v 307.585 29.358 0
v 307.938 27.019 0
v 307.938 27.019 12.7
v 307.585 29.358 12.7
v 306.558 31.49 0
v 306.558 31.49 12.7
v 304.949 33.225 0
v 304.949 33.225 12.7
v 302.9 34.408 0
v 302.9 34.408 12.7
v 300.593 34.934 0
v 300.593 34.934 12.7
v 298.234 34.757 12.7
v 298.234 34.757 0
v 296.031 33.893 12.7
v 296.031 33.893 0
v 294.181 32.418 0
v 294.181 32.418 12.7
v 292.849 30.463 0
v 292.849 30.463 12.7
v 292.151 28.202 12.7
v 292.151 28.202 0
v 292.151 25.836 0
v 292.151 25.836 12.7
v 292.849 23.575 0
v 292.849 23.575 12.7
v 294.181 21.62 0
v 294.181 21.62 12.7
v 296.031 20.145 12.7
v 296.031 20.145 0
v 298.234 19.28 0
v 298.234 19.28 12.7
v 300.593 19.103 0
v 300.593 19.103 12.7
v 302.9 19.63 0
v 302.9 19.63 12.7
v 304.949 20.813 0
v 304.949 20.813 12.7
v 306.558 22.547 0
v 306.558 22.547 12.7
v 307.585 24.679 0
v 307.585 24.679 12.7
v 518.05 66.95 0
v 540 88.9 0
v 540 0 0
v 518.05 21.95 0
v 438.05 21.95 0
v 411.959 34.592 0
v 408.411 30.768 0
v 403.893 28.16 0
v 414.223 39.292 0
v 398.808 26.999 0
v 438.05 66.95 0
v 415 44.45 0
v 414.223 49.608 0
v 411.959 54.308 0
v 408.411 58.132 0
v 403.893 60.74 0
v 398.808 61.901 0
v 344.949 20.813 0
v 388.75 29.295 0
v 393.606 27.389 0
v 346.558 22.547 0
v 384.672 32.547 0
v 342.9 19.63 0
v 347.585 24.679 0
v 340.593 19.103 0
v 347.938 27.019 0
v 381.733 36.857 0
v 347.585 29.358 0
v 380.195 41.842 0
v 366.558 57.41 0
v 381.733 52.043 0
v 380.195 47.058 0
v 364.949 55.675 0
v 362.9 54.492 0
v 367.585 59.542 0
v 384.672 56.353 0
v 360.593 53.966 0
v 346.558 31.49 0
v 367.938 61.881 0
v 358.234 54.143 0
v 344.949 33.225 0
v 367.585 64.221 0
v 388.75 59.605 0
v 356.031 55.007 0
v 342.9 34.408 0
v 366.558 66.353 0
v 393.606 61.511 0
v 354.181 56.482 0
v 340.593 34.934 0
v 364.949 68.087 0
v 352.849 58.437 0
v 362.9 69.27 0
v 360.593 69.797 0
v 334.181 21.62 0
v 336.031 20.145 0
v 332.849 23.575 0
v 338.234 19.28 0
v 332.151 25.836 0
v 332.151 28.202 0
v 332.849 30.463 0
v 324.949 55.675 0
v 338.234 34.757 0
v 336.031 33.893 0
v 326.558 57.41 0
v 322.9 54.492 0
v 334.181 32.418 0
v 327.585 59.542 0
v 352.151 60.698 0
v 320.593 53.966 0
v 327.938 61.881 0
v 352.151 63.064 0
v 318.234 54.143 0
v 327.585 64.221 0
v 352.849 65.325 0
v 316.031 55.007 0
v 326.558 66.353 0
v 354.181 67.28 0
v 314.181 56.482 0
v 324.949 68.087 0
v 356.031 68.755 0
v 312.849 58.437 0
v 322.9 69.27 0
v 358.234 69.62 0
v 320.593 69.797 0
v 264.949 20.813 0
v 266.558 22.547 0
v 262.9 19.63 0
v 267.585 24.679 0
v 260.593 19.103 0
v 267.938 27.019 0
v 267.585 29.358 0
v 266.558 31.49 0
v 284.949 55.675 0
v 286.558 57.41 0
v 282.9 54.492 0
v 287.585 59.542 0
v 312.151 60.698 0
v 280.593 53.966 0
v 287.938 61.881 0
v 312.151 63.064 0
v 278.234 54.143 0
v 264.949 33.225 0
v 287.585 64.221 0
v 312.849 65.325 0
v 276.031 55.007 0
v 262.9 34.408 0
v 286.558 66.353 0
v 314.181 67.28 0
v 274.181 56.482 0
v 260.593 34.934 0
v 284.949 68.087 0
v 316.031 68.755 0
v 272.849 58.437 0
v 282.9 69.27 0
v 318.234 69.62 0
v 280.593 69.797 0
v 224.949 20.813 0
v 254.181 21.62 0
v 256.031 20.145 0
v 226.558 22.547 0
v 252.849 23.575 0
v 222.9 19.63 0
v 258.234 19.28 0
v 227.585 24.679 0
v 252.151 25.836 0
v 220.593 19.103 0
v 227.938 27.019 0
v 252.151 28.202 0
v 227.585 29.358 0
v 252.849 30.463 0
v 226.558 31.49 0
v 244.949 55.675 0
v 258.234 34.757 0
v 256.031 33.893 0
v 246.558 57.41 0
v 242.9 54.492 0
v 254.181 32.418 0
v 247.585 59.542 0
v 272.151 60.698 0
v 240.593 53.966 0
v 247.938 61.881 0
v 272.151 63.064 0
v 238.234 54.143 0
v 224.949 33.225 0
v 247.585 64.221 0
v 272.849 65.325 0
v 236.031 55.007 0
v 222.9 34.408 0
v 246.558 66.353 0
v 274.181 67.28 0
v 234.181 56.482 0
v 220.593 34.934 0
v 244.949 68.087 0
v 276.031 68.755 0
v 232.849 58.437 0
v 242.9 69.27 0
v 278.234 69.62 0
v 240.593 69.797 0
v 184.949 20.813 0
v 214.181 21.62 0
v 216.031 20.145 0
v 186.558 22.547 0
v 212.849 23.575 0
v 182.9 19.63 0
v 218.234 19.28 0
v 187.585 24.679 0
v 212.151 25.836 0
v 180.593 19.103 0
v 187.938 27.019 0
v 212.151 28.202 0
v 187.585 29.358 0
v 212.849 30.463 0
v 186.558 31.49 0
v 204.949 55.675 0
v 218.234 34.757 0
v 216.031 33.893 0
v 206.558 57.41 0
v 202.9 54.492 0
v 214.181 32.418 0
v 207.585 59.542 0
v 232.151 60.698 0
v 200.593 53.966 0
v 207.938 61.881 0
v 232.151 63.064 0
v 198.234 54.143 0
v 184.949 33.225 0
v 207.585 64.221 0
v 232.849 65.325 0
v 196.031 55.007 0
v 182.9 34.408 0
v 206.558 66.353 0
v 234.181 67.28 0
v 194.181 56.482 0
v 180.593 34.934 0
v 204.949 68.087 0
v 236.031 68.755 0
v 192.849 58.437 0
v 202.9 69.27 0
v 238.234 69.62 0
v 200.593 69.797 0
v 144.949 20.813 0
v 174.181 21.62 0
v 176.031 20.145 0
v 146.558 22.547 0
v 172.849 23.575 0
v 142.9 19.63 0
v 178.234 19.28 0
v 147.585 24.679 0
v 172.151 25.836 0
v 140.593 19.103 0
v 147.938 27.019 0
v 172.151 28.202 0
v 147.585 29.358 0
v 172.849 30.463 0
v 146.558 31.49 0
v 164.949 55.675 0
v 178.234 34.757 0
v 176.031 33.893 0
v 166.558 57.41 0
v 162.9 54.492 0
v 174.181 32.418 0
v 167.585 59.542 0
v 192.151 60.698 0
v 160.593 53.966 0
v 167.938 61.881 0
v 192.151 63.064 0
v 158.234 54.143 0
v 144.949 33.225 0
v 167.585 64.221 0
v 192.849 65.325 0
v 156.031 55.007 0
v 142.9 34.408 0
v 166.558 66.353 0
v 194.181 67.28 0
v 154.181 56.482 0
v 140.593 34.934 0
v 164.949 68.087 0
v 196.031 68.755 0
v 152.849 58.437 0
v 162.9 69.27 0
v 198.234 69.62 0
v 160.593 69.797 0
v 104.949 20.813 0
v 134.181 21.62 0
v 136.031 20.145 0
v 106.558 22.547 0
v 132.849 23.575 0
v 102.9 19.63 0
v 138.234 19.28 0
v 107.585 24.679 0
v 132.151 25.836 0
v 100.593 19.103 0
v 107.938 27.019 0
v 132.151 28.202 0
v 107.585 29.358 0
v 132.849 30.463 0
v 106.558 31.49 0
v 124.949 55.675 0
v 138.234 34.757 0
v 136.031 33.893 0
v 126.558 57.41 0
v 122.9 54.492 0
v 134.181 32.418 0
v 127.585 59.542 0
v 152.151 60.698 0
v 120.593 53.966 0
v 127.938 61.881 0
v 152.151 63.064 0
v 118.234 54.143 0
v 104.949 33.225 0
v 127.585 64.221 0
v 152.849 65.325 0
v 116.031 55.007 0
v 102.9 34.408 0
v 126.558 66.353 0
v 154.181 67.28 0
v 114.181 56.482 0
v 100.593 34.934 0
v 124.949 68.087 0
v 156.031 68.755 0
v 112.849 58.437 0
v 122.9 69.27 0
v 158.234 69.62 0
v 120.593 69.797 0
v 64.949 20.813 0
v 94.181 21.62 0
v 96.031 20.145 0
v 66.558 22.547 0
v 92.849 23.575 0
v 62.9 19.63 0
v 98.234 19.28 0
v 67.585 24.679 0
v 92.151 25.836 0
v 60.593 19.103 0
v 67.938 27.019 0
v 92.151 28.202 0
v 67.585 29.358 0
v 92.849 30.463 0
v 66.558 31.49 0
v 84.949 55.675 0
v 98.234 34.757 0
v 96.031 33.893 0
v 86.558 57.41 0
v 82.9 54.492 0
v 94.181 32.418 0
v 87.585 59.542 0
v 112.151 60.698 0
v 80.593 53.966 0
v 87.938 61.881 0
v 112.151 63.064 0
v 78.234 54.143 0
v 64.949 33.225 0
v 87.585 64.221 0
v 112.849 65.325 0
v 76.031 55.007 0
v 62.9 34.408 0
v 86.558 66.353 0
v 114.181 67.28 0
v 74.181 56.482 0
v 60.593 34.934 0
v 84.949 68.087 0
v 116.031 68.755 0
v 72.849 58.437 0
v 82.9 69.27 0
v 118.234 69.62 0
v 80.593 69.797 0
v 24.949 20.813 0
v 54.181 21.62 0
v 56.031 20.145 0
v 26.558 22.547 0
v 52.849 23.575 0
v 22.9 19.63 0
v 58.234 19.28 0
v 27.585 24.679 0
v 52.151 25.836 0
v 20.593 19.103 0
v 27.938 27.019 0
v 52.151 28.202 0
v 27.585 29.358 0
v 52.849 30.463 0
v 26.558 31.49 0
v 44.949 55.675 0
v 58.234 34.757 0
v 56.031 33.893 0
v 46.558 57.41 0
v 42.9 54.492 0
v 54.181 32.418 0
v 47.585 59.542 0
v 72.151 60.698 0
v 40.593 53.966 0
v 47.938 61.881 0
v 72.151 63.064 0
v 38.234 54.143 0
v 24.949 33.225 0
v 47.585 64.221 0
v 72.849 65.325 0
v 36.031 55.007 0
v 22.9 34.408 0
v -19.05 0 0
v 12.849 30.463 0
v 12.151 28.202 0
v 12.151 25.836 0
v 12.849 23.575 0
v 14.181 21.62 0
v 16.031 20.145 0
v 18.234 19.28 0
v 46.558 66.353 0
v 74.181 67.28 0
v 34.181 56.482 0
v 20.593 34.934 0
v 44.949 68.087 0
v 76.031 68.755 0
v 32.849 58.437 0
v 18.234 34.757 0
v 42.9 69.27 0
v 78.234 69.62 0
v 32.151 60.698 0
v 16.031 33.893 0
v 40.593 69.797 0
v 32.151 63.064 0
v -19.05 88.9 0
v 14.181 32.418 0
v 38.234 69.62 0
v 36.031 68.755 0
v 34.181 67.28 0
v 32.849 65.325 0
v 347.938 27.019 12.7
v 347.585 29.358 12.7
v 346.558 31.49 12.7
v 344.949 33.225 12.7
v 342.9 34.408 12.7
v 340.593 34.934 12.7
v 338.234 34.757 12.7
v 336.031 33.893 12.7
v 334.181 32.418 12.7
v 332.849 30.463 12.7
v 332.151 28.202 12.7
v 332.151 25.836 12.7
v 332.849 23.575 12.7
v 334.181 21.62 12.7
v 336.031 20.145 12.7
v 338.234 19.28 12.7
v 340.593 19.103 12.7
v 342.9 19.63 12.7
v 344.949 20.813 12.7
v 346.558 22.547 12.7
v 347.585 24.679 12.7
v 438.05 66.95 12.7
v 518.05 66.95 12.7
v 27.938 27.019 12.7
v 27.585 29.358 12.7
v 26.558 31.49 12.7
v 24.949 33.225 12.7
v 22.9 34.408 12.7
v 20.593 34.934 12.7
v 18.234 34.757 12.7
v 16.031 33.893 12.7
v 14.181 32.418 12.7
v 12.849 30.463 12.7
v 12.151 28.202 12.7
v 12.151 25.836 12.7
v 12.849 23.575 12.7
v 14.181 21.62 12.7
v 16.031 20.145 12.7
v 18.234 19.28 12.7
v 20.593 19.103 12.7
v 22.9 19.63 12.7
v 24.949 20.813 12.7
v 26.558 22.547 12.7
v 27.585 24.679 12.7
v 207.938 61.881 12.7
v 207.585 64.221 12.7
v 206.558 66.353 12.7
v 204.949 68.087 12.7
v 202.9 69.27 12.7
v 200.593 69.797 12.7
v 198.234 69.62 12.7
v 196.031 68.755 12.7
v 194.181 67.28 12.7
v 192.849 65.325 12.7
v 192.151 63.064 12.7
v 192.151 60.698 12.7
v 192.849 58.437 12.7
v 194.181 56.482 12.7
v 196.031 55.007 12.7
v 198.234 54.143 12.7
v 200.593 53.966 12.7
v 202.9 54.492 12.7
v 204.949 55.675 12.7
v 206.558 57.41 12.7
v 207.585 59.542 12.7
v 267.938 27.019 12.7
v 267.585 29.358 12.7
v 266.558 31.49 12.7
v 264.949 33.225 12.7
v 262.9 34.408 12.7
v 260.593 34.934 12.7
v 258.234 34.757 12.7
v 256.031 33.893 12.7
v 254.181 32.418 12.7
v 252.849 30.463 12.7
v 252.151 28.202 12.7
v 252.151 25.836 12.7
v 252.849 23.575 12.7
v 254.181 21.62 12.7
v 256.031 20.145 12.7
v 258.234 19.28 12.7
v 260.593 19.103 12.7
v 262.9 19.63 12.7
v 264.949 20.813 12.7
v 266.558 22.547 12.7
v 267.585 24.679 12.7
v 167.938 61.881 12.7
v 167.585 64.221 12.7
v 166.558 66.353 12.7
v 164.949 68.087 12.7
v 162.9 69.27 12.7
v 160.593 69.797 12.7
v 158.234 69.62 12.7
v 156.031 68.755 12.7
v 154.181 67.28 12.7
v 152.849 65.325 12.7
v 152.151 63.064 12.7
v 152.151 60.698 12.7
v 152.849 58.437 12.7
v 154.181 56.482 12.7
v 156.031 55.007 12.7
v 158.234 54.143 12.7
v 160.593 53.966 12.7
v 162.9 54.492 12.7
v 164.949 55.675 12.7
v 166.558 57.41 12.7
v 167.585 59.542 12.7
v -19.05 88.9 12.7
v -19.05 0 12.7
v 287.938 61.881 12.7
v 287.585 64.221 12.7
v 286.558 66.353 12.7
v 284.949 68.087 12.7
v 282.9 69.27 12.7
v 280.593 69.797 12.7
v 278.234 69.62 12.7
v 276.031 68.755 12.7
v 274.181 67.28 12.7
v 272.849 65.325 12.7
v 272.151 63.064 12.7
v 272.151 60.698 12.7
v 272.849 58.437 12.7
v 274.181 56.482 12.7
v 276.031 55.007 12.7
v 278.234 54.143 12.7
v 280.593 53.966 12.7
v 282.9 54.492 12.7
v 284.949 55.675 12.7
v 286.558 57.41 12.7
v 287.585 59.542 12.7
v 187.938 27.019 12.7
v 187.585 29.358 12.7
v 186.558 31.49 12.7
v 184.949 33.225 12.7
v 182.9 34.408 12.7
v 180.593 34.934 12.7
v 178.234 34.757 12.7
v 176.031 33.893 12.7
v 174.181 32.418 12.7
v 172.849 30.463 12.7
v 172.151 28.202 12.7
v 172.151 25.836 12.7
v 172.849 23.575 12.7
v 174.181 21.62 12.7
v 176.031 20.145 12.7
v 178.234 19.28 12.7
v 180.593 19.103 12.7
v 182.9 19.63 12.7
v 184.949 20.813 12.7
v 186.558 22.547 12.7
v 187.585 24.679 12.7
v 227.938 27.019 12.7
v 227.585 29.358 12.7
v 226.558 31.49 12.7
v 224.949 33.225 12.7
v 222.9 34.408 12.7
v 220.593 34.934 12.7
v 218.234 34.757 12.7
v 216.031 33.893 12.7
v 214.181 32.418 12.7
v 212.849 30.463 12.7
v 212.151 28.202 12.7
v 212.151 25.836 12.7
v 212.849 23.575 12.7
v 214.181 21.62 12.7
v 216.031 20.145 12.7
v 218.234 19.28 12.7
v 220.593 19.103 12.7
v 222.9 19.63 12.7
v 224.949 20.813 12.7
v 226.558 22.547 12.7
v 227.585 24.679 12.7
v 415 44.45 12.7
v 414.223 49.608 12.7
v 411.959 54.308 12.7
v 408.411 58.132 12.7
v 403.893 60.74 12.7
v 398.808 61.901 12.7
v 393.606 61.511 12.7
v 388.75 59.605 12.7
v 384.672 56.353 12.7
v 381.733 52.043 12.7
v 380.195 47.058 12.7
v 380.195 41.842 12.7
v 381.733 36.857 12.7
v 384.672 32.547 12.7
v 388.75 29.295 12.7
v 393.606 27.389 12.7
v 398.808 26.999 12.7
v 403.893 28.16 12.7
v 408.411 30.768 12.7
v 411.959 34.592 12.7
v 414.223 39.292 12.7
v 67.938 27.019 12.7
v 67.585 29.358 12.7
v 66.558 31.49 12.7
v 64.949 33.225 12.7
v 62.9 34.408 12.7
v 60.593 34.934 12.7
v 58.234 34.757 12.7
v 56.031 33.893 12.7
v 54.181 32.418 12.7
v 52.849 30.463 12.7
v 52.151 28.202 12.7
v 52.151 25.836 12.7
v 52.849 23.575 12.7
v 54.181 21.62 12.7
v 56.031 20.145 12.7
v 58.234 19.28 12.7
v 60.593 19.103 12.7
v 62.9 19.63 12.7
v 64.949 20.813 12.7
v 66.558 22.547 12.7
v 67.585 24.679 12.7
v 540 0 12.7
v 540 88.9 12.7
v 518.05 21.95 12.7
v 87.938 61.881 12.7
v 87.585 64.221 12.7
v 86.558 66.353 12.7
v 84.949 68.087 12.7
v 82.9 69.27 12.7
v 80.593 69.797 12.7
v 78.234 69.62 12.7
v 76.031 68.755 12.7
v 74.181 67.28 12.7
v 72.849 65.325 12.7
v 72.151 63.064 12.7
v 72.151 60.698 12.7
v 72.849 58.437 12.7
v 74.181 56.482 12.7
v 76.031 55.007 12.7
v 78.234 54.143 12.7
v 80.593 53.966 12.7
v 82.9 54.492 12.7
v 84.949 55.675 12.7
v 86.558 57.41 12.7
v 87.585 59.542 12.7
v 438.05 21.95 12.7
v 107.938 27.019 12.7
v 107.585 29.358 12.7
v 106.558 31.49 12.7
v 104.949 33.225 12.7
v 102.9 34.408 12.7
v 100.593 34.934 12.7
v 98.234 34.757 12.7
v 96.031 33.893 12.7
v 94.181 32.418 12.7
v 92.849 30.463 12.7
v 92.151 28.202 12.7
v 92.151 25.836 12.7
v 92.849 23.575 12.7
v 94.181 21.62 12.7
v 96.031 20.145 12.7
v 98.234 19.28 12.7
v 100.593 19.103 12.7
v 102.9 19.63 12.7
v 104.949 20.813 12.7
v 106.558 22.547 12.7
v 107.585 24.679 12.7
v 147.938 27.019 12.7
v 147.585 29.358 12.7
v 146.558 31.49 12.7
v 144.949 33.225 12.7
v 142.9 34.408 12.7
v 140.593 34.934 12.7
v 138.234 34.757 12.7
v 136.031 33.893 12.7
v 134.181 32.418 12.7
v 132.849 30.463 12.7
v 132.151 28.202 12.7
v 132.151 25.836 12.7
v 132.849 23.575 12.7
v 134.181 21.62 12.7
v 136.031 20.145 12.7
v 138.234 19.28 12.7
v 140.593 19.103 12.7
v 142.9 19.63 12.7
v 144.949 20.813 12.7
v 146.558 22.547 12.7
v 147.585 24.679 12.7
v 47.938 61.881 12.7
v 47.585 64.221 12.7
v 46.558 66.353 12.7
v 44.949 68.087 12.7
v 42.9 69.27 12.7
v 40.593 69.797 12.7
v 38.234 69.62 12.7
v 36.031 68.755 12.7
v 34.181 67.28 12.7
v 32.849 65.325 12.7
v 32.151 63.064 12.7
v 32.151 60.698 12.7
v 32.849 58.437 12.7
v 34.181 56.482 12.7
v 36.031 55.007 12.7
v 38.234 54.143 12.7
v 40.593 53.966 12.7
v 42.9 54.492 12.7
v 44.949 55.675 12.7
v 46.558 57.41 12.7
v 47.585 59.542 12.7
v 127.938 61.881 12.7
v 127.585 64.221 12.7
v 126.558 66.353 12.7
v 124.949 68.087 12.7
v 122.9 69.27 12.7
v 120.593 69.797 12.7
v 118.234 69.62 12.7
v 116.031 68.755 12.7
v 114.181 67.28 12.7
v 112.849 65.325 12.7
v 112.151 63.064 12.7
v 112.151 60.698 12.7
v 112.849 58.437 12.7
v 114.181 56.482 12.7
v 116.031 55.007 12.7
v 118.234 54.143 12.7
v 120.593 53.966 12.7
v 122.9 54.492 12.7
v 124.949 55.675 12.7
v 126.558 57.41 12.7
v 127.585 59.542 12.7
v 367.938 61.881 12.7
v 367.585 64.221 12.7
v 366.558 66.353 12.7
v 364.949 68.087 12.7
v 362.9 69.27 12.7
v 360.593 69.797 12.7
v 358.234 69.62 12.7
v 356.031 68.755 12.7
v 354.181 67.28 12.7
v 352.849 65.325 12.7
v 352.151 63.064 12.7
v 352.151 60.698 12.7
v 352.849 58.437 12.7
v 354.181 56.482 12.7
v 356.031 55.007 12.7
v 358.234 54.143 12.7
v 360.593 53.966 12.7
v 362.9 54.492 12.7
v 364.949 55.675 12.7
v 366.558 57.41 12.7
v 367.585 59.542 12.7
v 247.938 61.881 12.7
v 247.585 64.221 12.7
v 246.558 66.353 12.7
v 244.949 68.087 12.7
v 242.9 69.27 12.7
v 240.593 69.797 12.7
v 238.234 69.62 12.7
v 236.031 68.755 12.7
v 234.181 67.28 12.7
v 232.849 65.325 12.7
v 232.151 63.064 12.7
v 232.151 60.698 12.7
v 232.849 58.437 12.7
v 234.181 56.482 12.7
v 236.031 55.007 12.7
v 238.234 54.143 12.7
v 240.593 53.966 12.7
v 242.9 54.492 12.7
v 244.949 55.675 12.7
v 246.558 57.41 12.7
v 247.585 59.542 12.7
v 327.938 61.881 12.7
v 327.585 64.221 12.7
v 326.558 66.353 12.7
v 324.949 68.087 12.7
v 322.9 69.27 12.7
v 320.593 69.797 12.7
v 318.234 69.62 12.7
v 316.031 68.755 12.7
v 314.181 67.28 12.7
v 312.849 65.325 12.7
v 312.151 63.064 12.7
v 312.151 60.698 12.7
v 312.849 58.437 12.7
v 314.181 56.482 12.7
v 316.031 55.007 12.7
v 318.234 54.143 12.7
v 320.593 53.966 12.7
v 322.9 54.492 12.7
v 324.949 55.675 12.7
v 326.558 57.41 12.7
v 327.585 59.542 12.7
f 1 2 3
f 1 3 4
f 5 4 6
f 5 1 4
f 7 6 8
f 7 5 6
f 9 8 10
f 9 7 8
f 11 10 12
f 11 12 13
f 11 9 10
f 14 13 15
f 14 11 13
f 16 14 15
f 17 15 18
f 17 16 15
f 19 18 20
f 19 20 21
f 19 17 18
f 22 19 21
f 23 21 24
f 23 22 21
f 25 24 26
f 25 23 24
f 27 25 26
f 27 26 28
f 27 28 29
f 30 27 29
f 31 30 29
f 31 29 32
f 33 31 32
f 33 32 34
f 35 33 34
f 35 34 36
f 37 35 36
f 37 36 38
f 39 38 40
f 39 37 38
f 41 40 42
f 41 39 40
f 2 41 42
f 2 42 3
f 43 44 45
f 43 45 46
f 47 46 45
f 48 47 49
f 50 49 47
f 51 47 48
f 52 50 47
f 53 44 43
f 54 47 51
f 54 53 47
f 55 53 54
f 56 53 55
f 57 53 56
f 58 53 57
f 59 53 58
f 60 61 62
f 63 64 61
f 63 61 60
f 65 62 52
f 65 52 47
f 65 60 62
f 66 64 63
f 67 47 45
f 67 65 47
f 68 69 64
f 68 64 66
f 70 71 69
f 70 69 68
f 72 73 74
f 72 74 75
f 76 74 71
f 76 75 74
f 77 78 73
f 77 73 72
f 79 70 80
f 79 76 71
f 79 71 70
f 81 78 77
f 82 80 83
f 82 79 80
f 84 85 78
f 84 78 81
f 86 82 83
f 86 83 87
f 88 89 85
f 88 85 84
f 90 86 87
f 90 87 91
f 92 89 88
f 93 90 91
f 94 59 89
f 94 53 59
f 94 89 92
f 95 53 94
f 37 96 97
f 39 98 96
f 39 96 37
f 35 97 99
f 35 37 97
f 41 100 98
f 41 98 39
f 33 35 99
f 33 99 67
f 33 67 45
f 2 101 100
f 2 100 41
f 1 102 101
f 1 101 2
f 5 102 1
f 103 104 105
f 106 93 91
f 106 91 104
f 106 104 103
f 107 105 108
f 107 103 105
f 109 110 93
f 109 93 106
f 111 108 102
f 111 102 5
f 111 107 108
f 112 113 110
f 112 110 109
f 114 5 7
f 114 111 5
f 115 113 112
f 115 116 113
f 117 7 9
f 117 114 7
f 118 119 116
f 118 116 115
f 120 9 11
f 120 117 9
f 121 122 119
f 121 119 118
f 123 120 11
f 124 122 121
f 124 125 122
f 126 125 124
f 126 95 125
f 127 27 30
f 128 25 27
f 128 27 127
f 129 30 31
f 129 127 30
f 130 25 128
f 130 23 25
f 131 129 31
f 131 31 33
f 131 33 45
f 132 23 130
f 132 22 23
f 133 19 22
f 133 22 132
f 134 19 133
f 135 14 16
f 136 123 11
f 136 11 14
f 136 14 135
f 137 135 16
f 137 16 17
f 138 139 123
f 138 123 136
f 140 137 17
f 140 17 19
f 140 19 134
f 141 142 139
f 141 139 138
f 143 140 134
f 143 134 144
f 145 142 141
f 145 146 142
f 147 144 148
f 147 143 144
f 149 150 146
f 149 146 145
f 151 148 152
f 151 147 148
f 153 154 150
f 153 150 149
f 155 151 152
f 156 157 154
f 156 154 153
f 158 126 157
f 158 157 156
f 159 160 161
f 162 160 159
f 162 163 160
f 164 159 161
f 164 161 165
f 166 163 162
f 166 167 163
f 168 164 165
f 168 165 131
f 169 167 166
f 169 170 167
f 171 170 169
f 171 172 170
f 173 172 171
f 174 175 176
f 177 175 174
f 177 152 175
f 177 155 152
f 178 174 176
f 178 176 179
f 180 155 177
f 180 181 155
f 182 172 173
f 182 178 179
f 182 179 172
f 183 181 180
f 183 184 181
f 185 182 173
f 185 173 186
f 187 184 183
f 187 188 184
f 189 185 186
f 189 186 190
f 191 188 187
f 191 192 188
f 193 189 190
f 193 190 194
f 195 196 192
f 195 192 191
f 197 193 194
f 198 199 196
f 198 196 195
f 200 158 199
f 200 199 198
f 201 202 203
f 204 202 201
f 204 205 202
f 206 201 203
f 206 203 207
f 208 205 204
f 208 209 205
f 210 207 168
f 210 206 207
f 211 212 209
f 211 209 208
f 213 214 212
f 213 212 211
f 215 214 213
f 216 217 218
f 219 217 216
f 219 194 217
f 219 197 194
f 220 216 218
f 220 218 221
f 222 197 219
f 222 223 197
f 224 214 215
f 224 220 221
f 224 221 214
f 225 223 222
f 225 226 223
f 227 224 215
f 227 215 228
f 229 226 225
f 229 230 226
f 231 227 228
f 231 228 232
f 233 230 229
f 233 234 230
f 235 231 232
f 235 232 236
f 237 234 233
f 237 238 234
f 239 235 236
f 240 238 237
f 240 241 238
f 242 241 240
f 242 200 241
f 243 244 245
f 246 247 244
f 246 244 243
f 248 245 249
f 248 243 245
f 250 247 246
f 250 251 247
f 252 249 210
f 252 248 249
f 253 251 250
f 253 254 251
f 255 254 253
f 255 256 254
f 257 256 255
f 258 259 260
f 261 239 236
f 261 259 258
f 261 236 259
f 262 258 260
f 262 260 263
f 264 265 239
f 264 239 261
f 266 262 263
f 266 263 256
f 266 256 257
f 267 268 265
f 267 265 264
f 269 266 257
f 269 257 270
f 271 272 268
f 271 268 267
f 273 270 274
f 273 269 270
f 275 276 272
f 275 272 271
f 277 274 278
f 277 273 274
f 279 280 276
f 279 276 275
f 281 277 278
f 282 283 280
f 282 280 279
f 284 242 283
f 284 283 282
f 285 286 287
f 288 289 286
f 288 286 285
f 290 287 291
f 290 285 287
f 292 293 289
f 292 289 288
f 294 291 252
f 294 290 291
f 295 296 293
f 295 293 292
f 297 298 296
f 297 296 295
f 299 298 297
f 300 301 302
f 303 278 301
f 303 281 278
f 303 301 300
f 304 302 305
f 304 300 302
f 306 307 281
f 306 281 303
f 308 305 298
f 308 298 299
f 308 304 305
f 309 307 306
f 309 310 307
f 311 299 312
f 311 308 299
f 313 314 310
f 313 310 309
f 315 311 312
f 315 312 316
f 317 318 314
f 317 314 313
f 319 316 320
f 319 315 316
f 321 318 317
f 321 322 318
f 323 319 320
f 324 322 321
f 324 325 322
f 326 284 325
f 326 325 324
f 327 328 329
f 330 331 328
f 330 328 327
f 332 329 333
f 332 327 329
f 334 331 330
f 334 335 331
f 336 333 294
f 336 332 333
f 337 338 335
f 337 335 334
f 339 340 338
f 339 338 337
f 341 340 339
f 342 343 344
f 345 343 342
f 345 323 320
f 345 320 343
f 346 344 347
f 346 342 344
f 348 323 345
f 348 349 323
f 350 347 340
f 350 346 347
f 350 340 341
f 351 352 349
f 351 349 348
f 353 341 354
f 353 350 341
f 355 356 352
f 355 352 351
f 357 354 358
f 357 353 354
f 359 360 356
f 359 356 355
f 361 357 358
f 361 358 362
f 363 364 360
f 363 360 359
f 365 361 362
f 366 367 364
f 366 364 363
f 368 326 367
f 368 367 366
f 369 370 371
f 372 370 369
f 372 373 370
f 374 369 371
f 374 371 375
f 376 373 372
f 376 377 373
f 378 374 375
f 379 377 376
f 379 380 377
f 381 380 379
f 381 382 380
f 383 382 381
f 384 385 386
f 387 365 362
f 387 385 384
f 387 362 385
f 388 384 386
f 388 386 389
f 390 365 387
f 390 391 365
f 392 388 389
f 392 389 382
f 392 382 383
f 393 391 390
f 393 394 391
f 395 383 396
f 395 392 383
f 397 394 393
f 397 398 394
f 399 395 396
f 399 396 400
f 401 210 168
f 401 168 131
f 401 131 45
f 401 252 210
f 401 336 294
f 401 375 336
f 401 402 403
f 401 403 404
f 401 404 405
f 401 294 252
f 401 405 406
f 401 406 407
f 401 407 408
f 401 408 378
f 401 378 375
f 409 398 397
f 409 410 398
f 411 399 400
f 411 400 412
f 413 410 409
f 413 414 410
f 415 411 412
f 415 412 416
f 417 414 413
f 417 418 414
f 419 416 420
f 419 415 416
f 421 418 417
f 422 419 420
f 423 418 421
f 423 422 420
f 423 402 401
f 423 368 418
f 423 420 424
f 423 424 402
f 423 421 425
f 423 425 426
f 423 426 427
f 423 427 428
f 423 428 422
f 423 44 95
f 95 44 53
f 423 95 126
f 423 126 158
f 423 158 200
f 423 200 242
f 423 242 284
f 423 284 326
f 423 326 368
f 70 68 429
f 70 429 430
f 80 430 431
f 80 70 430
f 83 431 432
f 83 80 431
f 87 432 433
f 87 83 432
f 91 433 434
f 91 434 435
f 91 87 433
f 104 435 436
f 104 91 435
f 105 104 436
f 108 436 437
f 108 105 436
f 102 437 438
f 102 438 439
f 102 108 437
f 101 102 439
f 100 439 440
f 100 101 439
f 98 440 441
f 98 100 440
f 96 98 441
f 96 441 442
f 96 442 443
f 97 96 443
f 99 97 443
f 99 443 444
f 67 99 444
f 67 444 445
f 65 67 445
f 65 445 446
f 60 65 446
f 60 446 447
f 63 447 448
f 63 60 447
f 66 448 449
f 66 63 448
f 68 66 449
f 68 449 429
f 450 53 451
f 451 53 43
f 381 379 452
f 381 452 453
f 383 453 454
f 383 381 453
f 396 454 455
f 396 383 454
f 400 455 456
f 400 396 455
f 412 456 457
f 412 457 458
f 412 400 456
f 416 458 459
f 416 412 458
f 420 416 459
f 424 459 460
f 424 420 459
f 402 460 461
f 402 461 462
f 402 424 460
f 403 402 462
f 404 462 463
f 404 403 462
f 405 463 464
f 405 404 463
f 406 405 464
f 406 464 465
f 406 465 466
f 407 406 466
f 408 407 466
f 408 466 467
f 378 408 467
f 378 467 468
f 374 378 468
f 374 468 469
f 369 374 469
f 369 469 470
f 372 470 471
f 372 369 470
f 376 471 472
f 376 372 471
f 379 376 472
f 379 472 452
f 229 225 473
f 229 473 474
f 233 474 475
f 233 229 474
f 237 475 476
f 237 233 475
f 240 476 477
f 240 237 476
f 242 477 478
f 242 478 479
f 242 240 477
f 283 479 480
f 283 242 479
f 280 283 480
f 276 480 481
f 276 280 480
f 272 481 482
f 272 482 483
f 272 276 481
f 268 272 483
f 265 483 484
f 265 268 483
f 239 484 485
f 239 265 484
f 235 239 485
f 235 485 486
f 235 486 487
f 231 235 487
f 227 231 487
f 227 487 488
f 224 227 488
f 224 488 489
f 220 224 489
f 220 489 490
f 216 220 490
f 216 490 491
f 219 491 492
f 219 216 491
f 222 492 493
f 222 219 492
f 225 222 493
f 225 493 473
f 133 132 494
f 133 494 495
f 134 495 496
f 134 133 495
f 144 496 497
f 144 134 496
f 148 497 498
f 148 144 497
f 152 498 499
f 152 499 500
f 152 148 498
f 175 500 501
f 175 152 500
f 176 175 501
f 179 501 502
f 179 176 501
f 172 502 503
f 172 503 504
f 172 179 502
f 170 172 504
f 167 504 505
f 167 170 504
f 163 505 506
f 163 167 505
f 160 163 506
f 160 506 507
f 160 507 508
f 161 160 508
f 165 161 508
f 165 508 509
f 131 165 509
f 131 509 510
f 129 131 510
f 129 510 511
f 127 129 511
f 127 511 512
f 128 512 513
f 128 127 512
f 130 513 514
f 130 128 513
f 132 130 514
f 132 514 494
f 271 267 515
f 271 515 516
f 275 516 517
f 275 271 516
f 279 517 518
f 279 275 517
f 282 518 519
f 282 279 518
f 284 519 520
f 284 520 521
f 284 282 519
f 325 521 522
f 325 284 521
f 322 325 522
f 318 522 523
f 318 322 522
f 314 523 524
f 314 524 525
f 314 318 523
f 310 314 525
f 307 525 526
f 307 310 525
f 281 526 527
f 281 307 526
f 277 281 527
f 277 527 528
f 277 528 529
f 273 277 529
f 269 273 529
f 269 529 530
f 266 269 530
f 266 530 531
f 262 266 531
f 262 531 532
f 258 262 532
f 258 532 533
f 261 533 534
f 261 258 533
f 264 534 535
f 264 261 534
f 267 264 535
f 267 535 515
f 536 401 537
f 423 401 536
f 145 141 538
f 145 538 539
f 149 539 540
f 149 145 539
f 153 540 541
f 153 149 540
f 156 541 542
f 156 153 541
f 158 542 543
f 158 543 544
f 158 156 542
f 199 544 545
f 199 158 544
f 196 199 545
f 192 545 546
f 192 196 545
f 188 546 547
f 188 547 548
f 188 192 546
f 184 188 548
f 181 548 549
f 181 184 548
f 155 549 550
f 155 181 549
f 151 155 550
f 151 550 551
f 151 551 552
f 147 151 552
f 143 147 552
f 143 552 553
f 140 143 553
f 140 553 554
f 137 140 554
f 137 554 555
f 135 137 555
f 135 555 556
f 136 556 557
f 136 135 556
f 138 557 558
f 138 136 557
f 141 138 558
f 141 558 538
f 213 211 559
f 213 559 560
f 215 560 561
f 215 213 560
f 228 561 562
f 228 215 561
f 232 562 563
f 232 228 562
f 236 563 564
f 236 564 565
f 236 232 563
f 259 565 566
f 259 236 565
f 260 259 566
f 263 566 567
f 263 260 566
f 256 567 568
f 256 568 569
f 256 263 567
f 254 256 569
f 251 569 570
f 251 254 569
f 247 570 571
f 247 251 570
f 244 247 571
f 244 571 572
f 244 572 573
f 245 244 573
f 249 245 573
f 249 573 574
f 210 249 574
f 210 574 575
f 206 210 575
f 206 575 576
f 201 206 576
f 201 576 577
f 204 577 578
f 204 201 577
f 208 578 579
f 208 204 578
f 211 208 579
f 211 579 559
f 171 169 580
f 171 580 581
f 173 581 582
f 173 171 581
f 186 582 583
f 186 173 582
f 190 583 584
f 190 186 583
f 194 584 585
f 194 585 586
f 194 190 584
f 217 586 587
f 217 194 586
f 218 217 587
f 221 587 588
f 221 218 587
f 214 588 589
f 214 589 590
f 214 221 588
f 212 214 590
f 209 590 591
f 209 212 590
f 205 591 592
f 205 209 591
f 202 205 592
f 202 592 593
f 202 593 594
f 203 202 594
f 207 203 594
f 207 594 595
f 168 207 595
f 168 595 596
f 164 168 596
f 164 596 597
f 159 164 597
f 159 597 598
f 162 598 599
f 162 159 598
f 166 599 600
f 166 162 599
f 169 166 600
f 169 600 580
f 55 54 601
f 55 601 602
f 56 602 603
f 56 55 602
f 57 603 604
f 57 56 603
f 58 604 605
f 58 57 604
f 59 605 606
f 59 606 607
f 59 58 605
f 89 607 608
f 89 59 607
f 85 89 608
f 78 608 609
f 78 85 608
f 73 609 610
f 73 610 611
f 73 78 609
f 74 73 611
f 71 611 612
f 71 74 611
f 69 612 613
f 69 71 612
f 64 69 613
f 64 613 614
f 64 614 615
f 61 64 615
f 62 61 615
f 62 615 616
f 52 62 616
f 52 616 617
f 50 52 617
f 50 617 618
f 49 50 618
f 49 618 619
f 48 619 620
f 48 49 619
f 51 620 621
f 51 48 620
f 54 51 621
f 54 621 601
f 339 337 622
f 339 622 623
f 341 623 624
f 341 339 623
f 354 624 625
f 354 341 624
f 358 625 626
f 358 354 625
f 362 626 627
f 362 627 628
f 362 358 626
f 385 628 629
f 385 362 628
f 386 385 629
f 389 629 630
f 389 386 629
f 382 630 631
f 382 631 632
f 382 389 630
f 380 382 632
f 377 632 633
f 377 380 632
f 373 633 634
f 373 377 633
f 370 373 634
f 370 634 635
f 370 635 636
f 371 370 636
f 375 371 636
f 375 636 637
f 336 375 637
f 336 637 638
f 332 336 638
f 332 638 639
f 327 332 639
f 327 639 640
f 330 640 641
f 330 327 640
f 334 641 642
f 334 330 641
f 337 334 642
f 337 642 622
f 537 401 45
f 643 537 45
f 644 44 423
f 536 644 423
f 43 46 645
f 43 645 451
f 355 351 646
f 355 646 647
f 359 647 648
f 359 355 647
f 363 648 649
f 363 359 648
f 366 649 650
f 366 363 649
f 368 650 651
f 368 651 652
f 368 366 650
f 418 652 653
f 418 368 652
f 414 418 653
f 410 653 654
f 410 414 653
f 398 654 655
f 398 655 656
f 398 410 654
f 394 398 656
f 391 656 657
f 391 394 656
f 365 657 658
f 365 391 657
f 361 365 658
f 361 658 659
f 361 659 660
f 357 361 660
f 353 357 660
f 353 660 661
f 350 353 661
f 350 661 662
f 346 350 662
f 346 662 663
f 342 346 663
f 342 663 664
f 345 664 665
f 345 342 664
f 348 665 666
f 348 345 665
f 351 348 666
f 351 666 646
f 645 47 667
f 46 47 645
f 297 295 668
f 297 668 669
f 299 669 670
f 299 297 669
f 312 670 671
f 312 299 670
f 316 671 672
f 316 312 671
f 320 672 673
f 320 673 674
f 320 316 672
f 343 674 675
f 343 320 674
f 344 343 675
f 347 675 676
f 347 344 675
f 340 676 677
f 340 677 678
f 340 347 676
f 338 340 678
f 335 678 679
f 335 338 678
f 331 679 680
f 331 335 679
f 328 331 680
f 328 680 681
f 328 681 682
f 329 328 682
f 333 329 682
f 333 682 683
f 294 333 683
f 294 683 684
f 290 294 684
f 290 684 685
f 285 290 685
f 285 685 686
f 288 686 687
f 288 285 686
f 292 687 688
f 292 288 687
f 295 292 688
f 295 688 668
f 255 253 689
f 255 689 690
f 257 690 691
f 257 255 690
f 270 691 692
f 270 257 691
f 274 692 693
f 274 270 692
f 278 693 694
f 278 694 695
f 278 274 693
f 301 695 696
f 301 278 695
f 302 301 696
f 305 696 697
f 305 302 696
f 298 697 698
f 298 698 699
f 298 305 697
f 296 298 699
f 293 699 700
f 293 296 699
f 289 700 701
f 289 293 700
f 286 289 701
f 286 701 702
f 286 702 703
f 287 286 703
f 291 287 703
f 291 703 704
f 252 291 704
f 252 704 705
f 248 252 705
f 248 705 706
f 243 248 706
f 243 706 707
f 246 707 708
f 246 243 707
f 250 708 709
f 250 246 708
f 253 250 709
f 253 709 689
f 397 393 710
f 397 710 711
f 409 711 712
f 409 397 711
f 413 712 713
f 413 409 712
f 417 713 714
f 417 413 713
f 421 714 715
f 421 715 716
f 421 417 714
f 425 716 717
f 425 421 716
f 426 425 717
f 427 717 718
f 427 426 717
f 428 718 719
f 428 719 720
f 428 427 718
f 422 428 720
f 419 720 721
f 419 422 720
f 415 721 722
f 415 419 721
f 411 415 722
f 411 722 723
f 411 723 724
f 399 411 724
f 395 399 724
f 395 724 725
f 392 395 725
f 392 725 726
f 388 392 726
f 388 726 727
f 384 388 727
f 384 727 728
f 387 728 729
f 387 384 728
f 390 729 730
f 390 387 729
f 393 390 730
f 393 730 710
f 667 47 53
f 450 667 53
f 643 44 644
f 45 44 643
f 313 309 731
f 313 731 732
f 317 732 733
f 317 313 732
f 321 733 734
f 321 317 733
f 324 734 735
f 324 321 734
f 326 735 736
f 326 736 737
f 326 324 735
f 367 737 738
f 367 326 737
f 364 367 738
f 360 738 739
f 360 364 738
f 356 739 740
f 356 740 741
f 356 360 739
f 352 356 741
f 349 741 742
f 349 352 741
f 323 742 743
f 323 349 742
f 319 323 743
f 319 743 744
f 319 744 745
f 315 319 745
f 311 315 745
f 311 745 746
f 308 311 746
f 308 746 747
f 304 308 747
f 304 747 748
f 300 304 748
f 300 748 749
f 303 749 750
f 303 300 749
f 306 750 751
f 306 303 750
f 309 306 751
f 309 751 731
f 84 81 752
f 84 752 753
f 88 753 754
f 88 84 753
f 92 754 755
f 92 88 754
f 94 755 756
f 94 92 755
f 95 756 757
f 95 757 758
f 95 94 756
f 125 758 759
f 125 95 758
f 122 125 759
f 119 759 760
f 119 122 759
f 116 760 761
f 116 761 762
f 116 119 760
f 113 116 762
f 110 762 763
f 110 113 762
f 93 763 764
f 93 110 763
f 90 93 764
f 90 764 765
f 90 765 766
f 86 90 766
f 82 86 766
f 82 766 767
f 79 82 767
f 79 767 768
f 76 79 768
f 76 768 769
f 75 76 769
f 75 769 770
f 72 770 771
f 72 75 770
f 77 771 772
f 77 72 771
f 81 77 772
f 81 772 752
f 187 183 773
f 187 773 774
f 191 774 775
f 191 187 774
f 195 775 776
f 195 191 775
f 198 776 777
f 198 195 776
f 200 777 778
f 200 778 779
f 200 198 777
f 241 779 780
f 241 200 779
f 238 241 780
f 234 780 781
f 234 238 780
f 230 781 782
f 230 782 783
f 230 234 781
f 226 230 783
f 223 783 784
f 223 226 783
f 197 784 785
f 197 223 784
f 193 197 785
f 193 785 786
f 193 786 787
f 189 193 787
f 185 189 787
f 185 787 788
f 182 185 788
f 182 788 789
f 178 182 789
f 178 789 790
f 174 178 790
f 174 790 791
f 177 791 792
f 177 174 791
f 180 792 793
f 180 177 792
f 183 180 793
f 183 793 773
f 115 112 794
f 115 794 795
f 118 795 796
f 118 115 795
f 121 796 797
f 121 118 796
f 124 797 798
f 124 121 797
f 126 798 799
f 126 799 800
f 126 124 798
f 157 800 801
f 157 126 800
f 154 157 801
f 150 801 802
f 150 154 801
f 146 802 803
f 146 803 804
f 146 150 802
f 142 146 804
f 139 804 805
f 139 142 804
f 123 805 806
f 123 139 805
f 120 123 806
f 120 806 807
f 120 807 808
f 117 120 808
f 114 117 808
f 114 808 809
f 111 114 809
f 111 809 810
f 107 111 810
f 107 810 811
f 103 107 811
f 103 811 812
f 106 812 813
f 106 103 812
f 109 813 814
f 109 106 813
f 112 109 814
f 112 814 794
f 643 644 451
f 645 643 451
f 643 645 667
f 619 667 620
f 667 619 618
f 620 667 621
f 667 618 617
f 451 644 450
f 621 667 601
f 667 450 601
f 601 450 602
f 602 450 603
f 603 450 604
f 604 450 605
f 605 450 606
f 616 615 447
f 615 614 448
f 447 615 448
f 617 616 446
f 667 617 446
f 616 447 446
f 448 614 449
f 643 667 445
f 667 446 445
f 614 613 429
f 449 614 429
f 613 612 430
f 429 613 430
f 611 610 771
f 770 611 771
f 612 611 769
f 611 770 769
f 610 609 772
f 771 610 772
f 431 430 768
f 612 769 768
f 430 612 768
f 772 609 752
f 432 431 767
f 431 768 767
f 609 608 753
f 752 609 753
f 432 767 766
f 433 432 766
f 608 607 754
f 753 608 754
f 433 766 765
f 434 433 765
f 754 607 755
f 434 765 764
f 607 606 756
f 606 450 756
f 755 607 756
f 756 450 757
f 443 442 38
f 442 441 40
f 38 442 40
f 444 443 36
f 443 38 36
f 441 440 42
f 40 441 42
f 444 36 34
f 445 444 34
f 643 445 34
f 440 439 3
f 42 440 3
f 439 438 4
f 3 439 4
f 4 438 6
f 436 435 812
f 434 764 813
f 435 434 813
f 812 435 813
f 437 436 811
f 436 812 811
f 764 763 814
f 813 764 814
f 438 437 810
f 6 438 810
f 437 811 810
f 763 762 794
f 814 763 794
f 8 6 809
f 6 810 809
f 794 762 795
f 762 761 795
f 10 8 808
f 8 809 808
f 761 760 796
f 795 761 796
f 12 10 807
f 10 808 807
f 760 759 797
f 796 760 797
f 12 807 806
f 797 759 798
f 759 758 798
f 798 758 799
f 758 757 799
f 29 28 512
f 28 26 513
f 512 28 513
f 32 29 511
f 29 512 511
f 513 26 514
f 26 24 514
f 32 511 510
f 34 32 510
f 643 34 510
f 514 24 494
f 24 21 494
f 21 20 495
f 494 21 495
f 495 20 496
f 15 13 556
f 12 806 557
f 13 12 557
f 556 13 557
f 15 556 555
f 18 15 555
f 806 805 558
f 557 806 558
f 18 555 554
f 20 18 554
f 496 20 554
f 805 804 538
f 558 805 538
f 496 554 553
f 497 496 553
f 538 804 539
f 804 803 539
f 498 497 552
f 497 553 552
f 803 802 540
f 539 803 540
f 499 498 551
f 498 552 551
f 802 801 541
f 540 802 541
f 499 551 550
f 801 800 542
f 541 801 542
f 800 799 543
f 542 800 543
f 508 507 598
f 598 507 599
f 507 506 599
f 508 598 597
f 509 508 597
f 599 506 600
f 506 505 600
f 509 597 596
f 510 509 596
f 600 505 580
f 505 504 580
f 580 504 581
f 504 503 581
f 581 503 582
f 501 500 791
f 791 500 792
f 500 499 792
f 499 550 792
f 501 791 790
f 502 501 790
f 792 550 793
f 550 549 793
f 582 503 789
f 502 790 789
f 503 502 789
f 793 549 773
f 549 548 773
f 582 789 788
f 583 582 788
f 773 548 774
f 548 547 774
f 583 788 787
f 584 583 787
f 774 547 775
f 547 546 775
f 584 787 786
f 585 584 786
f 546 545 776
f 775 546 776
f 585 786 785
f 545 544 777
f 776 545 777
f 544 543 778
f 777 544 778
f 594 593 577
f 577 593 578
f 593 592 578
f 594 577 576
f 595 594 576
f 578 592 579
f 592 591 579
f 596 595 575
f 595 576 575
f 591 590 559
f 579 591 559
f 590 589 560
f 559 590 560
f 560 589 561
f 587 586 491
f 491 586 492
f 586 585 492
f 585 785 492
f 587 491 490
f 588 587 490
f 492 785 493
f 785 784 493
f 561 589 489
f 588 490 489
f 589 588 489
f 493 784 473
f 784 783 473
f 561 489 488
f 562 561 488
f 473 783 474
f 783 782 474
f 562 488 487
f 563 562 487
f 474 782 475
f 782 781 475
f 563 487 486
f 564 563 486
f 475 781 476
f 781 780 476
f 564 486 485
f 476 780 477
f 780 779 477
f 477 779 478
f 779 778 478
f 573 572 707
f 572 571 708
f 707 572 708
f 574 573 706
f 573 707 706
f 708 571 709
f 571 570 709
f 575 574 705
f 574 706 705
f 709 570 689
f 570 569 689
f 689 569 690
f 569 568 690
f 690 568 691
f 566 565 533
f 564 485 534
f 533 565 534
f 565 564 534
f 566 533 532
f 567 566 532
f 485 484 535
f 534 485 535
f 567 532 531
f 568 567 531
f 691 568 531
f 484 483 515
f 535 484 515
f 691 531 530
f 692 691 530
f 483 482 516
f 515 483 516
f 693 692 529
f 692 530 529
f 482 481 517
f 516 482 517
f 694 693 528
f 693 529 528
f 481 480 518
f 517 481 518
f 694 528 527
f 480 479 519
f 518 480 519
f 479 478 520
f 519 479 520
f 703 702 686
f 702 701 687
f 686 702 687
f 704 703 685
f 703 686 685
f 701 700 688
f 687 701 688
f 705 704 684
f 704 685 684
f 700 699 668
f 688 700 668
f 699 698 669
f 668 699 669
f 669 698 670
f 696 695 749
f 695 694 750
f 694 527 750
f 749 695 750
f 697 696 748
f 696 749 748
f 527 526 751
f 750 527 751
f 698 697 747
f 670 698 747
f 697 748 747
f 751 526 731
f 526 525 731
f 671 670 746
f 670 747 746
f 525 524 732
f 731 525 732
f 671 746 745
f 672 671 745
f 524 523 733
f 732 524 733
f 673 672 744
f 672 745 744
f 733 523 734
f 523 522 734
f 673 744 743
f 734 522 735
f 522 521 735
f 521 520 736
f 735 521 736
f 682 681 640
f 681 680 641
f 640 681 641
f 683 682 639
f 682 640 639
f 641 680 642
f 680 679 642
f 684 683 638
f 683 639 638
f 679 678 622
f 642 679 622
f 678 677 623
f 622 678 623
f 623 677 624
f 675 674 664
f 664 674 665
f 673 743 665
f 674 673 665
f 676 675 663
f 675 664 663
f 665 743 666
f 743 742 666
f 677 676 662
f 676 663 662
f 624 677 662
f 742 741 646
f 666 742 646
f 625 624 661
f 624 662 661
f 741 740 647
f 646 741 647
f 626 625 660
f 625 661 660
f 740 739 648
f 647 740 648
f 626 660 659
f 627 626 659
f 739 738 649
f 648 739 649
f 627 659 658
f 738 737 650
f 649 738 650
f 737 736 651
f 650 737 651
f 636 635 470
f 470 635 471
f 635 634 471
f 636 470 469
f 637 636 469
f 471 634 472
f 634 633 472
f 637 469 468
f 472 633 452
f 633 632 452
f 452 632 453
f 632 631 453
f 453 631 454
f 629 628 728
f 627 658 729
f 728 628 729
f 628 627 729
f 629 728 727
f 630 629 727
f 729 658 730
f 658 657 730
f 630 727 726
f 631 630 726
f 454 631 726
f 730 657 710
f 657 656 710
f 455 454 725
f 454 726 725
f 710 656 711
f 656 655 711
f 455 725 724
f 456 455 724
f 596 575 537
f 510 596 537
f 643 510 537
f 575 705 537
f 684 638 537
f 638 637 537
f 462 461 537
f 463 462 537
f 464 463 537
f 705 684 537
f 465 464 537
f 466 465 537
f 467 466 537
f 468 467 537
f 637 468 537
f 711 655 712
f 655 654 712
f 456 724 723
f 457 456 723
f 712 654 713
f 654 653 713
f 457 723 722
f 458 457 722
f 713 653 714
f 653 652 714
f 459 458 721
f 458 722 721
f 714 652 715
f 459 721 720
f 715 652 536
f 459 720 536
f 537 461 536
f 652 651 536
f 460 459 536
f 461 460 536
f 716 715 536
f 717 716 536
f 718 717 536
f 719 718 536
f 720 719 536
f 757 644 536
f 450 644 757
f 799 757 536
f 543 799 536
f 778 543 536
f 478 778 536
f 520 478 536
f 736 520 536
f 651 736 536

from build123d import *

# Parameters (mm, degrees)
SKETCH_R   = 7.9375
SKETCH_R_2 = 17.5
SKETCH_W   = 80
SKETCH_H   = 45
PAD_DEPTH  = 12.7


with BuildPart() as part:
    # Sketch → Pad (new body)
    with BuildSketch(Plane.XY):
        Polygon((0, 88.9), (540, 88.9), (540, 0), (0, 0), (-19.05, 0), (-19.05, 88.9), align=None)
        with Locations((20, 27.01875)):
            Circle(SKETCH_R, mode=Mode.SUBTRACT)
        with Locations((60, 27.01875)):
            Circle(SKETCH_R, mode=Mode.SUBTRACT)
        with Locations((397.5, 44.45)):
            Circle(SKETCH_R_2, mode=Mode.SUBTRACT)
        with Locations((478.05, 44.45)):
            Rectangle(SKETCH_W, SKETCH_H, mode=Mode.SUBTRACT)
        with Locations((40, 61.88125)):
            Circle(SKETCH_R, mode=Mode.SUBTRACT)
        with Locations((100, 27.01875)):
            Circle(SKETCH_R, mode=Mode.SUBTRACT)
        with Locations((140, 27.01875)):
            Circle(SKETCH_R, mode=Mode.SUBTRACT)
        with Locations((180, 27.01875)):
            Circle(SKETCH_R, mode=Mode.SUBTRACT)
        with Locations((220, 27.01875)):
            Circle(SKETCH_R, mode=Mode.SUBTRACT)
        with Locations((260, 27.01875)):
            Circle(SKETCH_R, mode=Mode.SUBTRACT)
        with Locations((300, 27.01875)):
            Circle(SKETCH_R, mode=Mode.SUBTRACT)
        with Locations((340, 27.01875)):
            Circle(SKETCH_R, mode=Mode.SUBTRACT)
        with Locations((80, 61.88125)):
            Circle(SKETCH_R, mode=Mode.SUBTRACT)
        with Locations((120, 61.88125)):
            Circle(SKETCH_R, mode=Mode.SUBTRACT)
        with Locations((160, 61.88125)):
            Circle(SKETCH_R, mode=Mode.SUBTRACT)
        with Locations((200, 61.88125)):
            Circle(SKETCH_R, mode=Mode.SUBTRACT)
        with Locations((240, 61.88125)):
            Circle(SKETCH_R, mode=Mode.SUBTRACT)
        with Locations((280, 61.88125)):
            Circle(SKETCH_R, mode=Mode.SUBTRACT)
        with Locations((320, 61.88125)):
            Circle(SKETCH_R, mode=Mode.SUBTRACT)
        with Locations((360, 61.88125)):
            Circle(SKETCH_R, mode=Mode.SUBTRACT)
    extrude(amount=PAD_DEPTH)


solid = part.part
